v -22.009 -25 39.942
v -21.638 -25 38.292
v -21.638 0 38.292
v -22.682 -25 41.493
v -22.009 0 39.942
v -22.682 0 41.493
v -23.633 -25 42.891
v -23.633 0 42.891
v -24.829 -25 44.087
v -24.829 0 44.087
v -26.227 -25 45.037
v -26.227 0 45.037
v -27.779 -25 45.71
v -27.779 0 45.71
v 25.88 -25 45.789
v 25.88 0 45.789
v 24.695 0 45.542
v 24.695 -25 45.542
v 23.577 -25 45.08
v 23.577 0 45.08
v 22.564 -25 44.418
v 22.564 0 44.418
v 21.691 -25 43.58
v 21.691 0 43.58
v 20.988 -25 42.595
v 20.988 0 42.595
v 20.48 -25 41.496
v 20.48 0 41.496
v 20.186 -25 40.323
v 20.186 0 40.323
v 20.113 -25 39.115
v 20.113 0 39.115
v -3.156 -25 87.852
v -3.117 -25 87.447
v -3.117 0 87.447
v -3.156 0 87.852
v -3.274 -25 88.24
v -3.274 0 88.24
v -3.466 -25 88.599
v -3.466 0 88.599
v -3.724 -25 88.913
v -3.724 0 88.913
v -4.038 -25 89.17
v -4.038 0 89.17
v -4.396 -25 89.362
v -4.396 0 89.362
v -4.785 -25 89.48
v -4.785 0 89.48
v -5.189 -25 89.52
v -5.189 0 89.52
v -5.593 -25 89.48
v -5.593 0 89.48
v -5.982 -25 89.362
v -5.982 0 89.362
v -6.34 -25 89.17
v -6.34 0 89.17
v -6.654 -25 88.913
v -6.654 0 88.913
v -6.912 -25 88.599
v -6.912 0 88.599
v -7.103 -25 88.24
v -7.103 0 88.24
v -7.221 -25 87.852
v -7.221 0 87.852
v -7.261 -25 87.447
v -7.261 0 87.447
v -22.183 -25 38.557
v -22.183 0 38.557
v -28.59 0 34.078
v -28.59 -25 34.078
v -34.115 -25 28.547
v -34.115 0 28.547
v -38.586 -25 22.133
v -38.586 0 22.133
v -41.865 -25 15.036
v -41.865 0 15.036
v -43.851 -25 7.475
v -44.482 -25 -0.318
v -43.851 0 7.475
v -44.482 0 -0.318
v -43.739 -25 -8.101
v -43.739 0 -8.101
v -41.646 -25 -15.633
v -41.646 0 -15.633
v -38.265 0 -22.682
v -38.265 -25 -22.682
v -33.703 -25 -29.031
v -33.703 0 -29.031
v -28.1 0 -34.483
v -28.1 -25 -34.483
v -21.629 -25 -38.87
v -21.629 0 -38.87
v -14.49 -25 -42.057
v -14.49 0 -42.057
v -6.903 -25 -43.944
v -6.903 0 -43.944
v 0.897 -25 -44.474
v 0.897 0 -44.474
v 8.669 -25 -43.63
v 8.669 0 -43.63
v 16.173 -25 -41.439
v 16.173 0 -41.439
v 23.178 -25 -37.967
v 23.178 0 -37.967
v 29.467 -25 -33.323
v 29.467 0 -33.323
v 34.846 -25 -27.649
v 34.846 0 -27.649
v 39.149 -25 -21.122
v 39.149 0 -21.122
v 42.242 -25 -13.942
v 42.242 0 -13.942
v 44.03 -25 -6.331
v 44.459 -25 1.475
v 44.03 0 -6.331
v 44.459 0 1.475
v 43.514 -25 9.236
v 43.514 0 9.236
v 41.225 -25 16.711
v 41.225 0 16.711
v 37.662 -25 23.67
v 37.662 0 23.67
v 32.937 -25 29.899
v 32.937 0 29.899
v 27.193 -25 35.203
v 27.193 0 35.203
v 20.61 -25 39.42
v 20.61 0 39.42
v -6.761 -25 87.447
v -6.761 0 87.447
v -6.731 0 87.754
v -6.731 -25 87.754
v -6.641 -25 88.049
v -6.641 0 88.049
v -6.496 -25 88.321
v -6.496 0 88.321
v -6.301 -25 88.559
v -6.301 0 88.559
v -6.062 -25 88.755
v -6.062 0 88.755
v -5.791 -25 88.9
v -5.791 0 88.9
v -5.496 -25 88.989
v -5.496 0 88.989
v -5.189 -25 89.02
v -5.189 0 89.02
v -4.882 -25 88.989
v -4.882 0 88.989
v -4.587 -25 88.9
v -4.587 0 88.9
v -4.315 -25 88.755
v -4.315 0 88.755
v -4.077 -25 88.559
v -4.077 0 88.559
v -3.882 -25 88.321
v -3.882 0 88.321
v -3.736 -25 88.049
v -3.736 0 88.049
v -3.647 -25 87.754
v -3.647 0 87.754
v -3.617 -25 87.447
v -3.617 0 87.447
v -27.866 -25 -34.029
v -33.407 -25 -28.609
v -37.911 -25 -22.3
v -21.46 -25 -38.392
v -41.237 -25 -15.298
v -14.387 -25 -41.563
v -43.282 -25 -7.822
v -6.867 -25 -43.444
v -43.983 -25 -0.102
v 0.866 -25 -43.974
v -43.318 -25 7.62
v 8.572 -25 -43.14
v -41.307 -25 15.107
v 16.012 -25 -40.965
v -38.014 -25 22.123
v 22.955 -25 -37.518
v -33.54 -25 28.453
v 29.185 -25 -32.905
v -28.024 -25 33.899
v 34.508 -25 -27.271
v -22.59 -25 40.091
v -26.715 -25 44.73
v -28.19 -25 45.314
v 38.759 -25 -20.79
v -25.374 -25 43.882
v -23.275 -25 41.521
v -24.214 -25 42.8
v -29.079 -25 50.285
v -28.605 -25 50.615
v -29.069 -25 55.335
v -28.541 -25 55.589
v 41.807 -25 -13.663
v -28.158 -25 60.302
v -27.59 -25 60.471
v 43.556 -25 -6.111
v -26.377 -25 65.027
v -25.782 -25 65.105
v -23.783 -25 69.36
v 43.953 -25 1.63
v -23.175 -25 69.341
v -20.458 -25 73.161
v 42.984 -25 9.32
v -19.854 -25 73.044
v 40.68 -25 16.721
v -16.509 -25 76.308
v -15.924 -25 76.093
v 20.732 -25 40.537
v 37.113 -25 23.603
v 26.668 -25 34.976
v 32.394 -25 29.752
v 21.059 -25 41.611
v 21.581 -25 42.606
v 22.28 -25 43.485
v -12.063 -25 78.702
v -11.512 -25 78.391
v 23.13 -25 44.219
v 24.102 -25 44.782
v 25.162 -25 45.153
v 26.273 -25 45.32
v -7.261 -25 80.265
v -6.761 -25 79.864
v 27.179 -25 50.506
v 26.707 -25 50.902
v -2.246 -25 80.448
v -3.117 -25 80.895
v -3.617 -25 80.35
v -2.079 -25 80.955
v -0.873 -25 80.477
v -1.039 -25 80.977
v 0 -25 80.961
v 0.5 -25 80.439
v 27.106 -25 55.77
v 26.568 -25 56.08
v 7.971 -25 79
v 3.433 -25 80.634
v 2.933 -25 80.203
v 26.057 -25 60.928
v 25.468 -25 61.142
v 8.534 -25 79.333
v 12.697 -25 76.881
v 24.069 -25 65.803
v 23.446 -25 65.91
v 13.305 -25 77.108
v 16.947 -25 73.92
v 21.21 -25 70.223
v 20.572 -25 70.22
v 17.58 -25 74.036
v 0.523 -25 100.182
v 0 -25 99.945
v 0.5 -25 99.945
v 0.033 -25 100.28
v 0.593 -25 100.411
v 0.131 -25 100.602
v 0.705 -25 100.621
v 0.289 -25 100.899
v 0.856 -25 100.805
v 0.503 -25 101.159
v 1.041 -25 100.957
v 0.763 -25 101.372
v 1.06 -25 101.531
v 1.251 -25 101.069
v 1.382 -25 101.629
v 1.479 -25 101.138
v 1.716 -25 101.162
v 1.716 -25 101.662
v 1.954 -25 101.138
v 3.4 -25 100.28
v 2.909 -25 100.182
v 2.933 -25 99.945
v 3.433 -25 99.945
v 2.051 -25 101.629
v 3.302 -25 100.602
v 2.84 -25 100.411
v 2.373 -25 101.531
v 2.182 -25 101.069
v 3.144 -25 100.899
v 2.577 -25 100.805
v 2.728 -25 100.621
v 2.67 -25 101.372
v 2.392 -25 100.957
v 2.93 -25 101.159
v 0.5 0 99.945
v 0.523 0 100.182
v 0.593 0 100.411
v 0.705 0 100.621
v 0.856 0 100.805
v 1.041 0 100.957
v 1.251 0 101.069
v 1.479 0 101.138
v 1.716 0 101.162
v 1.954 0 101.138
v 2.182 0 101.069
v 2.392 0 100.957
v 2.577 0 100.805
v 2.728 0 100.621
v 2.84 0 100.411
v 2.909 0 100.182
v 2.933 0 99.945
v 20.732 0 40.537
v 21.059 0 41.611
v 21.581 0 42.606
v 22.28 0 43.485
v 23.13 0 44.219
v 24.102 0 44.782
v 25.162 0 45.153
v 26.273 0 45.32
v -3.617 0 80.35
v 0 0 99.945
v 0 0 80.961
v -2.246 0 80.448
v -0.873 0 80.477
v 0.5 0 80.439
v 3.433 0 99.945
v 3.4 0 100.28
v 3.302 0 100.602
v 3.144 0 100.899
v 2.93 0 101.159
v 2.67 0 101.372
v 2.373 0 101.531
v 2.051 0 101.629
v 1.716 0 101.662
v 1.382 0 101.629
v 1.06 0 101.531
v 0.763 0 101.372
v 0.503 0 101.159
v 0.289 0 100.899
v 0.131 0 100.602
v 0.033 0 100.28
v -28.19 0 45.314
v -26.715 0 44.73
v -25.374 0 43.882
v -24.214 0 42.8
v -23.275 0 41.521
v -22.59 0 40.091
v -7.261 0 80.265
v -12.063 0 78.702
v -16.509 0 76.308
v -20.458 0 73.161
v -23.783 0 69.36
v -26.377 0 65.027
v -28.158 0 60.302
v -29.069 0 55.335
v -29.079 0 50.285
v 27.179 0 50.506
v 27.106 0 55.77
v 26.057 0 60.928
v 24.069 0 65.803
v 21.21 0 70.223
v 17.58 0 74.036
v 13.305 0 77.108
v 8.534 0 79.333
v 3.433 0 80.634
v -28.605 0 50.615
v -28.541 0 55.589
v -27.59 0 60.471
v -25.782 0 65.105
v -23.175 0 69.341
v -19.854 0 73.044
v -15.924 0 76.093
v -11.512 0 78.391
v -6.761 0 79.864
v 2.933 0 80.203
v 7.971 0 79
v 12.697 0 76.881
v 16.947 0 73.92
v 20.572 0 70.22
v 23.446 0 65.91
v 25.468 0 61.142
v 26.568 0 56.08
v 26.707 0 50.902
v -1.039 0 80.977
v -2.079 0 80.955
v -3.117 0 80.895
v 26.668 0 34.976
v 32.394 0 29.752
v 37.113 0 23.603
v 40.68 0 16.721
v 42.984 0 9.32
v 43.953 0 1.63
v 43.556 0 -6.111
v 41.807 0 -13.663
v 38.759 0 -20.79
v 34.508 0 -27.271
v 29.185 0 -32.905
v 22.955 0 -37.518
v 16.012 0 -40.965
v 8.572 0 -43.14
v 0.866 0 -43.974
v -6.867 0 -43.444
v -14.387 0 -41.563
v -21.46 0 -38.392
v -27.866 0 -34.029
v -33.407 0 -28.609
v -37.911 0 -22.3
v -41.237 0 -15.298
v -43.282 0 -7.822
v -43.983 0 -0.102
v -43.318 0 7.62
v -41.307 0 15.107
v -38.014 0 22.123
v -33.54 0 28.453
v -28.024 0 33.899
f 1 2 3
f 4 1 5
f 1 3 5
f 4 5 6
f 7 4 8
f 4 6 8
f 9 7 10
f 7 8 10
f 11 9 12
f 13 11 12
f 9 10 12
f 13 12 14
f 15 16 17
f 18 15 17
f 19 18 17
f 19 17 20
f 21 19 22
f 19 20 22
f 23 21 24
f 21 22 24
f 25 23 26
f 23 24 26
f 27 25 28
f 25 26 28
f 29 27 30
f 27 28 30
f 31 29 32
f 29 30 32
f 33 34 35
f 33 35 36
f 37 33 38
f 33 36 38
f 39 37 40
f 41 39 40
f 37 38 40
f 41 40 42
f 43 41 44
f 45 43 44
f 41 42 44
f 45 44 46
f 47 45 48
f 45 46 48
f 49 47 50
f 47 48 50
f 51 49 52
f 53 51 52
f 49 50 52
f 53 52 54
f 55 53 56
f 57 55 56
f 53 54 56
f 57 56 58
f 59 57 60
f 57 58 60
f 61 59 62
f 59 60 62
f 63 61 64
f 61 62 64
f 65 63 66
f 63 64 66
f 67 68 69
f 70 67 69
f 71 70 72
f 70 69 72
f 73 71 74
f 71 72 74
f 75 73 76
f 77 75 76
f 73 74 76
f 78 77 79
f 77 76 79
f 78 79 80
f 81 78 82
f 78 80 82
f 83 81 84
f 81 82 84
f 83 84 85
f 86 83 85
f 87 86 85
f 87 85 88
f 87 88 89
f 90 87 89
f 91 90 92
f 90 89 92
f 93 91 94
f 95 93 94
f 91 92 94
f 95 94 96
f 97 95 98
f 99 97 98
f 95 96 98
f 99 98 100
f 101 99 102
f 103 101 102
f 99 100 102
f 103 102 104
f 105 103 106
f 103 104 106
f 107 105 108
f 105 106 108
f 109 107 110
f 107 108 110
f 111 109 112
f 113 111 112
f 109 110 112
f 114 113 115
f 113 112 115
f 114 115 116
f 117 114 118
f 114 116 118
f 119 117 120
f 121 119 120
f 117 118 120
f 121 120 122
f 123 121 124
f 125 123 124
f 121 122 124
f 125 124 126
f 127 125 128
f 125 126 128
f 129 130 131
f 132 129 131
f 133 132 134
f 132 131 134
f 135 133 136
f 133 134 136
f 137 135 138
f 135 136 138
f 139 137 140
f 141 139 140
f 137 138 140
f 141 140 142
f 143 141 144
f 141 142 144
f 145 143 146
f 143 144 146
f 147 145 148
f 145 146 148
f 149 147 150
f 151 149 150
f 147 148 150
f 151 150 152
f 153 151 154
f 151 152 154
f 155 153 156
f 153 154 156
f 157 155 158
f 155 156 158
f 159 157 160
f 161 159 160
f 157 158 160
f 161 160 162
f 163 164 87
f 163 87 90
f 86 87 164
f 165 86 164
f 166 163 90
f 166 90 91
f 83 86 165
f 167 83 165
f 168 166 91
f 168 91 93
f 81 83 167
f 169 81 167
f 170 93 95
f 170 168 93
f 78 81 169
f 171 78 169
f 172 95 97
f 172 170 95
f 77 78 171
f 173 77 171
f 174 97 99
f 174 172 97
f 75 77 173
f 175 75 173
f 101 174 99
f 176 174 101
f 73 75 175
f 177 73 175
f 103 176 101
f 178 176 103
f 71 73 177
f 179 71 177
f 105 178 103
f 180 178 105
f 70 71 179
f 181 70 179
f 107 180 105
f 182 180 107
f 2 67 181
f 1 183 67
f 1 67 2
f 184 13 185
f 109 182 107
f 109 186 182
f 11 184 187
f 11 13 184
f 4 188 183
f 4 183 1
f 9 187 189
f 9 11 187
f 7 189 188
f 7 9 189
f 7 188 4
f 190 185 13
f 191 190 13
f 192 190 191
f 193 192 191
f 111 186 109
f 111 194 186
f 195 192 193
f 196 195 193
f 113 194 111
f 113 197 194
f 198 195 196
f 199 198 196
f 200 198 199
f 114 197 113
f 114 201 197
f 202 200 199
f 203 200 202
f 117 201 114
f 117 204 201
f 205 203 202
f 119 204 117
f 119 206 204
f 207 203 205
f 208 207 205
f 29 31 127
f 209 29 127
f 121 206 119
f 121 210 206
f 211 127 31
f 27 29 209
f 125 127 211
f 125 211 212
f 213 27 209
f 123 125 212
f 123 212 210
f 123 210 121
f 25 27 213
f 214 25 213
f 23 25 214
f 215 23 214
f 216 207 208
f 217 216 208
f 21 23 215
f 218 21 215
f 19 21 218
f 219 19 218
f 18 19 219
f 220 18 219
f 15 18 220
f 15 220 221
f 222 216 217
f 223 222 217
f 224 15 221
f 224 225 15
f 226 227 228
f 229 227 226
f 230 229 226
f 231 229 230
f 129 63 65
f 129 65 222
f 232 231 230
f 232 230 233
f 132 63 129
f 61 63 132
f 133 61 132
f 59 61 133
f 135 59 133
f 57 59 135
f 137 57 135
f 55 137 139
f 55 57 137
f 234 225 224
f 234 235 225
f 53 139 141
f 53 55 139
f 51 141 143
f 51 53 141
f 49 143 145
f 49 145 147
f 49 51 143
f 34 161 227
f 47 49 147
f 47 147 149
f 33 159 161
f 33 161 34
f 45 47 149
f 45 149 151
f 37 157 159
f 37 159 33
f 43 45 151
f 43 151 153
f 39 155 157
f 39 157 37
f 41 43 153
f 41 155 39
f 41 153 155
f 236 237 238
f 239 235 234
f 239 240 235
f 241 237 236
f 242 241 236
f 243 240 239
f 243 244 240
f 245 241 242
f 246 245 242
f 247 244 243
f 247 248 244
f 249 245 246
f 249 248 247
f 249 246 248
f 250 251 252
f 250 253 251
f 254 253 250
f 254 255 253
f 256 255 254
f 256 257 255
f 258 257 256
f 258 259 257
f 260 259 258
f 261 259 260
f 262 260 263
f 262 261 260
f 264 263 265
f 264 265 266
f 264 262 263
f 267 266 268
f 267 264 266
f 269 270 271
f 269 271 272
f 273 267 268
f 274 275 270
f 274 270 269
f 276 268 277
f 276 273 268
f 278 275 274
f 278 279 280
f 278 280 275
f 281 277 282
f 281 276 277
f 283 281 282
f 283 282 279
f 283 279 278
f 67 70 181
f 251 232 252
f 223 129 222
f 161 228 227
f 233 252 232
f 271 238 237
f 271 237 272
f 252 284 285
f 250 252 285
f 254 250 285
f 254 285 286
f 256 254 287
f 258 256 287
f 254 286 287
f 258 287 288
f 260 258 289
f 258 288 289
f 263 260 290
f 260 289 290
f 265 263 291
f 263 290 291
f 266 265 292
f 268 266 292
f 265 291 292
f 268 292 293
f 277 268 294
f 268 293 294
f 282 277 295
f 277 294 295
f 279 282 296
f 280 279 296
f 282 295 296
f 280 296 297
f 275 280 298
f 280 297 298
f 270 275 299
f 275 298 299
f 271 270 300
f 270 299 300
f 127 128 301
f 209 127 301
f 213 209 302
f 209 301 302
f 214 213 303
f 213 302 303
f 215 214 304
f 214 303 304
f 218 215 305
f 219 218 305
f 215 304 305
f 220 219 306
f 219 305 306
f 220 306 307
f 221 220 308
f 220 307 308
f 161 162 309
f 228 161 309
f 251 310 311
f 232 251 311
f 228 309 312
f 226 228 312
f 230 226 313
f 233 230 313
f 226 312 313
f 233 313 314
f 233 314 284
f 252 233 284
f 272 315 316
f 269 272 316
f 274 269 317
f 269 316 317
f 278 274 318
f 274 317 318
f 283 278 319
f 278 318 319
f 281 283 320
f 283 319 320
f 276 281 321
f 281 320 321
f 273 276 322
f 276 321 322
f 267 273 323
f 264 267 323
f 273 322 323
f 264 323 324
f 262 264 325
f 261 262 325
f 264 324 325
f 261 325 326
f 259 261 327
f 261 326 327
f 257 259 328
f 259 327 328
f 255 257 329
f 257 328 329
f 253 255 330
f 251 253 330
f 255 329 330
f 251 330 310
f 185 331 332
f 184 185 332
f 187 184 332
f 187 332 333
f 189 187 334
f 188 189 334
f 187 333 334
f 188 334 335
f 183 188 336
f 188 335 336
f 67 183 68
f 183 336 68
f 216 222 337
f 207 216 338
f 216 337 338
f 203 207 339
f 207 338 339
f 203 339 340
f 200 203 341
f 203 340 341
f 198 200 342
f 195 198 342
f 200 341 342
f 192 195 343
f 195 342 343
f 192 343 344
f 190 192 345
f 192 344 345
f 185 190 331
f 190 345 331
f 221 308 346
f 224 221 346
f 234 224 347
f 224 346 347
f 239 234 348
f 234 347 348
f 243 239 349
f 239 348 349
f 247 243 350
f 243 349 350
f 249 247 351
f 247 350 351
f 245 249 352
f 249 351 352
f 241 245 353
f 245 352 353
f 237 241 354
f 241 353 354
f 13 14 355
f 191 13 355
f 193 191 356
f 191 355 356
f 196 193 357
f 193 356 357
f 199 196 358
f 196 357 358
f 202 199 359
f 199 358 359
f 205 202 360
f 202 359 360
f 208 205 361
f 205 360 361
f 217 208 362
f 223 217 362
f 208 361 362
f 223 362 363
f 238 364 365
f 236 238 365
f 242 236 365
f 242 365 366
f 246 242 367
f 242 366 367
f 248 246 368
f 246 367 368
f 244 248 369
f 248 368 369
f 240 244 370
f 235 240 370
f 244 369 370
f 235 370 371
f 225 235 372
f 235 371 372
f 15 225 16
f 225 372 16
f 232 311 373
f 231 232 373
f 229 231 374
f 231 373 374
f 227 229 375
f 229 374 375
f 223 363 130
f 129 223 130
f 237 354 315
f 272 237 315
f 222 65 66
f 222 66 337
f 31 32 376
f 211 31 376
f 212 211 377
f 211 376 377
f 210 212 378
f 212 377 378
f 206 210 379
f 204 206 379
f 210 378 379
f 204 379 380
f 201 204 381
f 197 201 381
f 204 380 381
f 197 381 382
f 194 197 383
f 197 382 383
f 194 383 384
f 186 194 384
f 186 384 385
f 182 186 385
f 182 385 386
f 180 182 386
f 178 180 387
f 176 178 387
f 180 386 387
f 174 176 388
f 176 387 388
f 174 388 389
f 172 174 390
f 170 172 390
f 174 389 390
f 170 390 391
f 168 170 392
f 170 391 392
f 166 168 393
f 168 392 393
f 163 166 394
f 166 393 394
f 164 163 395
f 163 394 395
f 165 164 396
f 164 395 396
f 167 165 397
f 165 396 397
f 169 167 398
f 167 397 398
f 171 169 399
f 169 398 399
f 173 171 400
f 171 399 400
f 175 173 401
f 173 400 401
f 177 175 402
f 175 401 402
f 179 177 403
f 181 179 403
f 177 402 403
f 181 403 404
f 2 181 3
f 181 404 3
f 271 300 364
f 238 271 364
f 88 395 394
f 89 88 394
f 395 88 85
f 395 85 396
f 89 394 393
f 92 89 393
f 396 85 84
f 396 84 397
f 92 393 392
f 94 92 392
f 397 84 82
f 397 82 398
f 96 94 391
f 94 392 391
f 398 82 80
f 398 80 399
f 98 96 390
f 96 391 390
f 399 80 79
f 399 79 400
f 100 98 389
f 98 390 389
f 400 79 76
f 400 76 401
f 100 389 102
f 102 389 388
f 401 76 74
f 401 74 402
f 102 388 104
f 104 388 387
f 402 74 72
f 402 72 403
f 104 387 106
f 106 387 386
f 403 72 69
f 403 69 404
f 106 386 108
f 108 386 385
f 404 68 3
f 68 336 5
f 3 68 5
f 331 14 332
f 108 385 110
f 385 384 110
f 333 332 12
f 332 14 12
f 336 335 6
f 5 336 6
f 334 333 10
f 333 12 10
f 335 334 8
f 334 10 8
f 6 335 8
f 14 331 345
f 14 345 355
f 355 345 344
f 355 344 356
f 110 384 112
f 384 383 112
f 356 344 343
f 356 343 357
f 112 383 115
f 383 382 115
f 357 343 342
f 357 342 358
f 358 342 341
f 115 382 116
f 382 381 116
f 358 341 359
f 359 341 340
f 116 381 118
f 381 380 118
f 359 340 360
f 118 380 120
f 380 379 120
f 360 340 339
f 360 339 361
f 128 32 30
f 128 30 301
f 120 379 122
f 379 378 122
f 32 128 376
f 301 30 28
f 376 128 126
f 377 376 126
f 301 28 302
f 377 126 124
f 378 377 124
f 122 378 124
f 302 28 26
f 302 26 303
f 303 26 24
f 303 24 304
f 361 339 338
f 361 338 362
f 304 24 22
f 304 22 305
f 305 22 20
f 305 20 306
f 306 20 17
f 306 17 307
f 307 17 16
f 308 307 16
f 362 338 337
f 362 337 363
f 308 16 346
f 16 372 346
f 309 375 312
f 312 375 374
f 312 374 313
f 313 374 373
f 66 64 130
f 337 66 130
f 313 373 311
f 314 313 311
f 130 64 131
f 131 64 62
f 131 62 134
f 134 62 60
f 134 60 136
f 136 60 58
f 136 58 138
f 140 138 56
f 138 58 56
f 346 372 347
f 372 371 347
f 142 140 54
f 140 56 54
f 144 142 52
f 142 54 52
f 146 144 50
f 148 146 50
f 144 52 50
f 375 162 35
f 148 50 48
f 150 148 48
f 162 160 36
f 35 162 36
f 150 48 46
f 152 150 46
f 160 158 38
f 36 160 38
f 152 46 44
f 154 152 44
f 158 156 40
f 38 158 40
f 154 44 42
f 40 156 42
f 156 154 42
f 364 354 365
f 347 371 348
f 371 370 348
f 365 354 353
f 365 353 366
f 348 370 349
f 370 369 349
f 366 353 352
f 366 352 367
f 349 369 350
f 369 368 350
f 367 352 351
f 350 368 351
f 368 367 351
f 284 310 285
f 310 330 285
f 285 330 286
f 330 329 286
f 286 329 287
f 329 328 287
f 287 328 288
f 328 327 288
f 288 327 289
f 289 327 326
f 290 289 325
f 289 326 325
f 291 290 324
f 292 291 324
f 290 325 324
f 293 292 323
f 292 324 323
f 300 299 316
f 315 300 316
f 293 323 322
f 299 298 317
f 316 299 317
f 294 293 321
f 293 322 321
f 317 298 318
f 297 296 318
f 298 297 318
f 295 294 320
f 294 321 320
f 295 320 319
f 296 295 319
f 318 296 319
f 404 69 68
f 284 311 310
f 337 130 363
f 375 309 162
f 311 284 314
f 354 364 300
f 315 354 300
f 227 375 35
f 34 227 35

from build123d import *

# Parameters (mm, degrees)
F1_DEPTH = 25


with BuildPart() as f1:
    # F0 (on Front) → F1 (new body)
    with BuildSketch(Plane.XZ):
        with BuildLine():
            ThreePointArc((-28.190229, 45.313943), (-24.214198, 42.800089), (-22.182589, 38.557349))
            ThreePointArc((-22.182589, 38.557349), (0.896682, -44.473951), (20.610411, 39.420139))
            ThreePointArc((20.610411, 39.420139), (22.279856, 43.485217), (26.273011, 45.320053))
            ThreePointArc((26.273011, 45.320053), (22.742729, 68.079793), (3.432866, 80.633594))
            Line((3.432866, 80.633594), (3.432866, 99.945173))
            ThreePointArc((3.432866, 99.945173), (1.716433, 101.661606), (0, 99.945173))
            Line((0, 99.945173), (0, 80.961105))
            ThreePointArc((0, 80.961105), (-1.559237, 80.971042), (-3.116643, 80.894866))
            Line((-3.116643, 80.894866), (-3.116643, 87.447404))
            ThreePointArc((-3.116643, 87.447404), (-5.188906, 89.519667), (-7.26117, 87.447404))
            Line((-7.26117, 87.447404), (-7.26117, 80.265008))
            ThreePointArc((-7.26117, 80.265008), (-25.177238, 67.251534), (-28.190229, 45.313943))
        make_face()
        with BuildLine():
            ThreePointArc((-27.778708, 45.710137), (-24.574012, 67.281705), (-6.76117, 79.863648))
            Line((-6.76117, 79.863648), (-6.76117, 87.447404))
            ThreePointArc((-6.76117, 87.447404), (-5.188906, 89.019667), (-3.616643, 87.447404))
            Line((-3.616643, 87.447404), (-3.616643, 80.349799))
            ThreePointArc((-3.616643, 80.349799), (-1.559979, 80.470911), (0.5, 80.438979))
            Line((0.5, 80.438979), (0.5, 99.945173))
            ThreePointArc((0.5, 99.945173), (1.716433, 101.161606), (2.932866, 99.945173))
            Line((2.932866, 99.945173), (2.932866, 80.202862))
            ThreePointArc((2.932866, 80.202862), (22.110002, 68.132408), (25.88031, 45.788658))
            ThreePointArc((25.88031, 45.788658), (21.690506, 43.580432), (20.113465, 39.1146))
            ThreePointArc((20.113465, 39.1146), (0.866103, -43.974461), (-21.63804, 38.292279))
            ThreePointArc((-21.63804, 38.292279), (-23.633494, 42.891018), (-27.778708, 45.710137))
        make_face(mode=Mode.SUBTRACT)
    extrude(amount=F1_DEPTH)


solid = f1.part
